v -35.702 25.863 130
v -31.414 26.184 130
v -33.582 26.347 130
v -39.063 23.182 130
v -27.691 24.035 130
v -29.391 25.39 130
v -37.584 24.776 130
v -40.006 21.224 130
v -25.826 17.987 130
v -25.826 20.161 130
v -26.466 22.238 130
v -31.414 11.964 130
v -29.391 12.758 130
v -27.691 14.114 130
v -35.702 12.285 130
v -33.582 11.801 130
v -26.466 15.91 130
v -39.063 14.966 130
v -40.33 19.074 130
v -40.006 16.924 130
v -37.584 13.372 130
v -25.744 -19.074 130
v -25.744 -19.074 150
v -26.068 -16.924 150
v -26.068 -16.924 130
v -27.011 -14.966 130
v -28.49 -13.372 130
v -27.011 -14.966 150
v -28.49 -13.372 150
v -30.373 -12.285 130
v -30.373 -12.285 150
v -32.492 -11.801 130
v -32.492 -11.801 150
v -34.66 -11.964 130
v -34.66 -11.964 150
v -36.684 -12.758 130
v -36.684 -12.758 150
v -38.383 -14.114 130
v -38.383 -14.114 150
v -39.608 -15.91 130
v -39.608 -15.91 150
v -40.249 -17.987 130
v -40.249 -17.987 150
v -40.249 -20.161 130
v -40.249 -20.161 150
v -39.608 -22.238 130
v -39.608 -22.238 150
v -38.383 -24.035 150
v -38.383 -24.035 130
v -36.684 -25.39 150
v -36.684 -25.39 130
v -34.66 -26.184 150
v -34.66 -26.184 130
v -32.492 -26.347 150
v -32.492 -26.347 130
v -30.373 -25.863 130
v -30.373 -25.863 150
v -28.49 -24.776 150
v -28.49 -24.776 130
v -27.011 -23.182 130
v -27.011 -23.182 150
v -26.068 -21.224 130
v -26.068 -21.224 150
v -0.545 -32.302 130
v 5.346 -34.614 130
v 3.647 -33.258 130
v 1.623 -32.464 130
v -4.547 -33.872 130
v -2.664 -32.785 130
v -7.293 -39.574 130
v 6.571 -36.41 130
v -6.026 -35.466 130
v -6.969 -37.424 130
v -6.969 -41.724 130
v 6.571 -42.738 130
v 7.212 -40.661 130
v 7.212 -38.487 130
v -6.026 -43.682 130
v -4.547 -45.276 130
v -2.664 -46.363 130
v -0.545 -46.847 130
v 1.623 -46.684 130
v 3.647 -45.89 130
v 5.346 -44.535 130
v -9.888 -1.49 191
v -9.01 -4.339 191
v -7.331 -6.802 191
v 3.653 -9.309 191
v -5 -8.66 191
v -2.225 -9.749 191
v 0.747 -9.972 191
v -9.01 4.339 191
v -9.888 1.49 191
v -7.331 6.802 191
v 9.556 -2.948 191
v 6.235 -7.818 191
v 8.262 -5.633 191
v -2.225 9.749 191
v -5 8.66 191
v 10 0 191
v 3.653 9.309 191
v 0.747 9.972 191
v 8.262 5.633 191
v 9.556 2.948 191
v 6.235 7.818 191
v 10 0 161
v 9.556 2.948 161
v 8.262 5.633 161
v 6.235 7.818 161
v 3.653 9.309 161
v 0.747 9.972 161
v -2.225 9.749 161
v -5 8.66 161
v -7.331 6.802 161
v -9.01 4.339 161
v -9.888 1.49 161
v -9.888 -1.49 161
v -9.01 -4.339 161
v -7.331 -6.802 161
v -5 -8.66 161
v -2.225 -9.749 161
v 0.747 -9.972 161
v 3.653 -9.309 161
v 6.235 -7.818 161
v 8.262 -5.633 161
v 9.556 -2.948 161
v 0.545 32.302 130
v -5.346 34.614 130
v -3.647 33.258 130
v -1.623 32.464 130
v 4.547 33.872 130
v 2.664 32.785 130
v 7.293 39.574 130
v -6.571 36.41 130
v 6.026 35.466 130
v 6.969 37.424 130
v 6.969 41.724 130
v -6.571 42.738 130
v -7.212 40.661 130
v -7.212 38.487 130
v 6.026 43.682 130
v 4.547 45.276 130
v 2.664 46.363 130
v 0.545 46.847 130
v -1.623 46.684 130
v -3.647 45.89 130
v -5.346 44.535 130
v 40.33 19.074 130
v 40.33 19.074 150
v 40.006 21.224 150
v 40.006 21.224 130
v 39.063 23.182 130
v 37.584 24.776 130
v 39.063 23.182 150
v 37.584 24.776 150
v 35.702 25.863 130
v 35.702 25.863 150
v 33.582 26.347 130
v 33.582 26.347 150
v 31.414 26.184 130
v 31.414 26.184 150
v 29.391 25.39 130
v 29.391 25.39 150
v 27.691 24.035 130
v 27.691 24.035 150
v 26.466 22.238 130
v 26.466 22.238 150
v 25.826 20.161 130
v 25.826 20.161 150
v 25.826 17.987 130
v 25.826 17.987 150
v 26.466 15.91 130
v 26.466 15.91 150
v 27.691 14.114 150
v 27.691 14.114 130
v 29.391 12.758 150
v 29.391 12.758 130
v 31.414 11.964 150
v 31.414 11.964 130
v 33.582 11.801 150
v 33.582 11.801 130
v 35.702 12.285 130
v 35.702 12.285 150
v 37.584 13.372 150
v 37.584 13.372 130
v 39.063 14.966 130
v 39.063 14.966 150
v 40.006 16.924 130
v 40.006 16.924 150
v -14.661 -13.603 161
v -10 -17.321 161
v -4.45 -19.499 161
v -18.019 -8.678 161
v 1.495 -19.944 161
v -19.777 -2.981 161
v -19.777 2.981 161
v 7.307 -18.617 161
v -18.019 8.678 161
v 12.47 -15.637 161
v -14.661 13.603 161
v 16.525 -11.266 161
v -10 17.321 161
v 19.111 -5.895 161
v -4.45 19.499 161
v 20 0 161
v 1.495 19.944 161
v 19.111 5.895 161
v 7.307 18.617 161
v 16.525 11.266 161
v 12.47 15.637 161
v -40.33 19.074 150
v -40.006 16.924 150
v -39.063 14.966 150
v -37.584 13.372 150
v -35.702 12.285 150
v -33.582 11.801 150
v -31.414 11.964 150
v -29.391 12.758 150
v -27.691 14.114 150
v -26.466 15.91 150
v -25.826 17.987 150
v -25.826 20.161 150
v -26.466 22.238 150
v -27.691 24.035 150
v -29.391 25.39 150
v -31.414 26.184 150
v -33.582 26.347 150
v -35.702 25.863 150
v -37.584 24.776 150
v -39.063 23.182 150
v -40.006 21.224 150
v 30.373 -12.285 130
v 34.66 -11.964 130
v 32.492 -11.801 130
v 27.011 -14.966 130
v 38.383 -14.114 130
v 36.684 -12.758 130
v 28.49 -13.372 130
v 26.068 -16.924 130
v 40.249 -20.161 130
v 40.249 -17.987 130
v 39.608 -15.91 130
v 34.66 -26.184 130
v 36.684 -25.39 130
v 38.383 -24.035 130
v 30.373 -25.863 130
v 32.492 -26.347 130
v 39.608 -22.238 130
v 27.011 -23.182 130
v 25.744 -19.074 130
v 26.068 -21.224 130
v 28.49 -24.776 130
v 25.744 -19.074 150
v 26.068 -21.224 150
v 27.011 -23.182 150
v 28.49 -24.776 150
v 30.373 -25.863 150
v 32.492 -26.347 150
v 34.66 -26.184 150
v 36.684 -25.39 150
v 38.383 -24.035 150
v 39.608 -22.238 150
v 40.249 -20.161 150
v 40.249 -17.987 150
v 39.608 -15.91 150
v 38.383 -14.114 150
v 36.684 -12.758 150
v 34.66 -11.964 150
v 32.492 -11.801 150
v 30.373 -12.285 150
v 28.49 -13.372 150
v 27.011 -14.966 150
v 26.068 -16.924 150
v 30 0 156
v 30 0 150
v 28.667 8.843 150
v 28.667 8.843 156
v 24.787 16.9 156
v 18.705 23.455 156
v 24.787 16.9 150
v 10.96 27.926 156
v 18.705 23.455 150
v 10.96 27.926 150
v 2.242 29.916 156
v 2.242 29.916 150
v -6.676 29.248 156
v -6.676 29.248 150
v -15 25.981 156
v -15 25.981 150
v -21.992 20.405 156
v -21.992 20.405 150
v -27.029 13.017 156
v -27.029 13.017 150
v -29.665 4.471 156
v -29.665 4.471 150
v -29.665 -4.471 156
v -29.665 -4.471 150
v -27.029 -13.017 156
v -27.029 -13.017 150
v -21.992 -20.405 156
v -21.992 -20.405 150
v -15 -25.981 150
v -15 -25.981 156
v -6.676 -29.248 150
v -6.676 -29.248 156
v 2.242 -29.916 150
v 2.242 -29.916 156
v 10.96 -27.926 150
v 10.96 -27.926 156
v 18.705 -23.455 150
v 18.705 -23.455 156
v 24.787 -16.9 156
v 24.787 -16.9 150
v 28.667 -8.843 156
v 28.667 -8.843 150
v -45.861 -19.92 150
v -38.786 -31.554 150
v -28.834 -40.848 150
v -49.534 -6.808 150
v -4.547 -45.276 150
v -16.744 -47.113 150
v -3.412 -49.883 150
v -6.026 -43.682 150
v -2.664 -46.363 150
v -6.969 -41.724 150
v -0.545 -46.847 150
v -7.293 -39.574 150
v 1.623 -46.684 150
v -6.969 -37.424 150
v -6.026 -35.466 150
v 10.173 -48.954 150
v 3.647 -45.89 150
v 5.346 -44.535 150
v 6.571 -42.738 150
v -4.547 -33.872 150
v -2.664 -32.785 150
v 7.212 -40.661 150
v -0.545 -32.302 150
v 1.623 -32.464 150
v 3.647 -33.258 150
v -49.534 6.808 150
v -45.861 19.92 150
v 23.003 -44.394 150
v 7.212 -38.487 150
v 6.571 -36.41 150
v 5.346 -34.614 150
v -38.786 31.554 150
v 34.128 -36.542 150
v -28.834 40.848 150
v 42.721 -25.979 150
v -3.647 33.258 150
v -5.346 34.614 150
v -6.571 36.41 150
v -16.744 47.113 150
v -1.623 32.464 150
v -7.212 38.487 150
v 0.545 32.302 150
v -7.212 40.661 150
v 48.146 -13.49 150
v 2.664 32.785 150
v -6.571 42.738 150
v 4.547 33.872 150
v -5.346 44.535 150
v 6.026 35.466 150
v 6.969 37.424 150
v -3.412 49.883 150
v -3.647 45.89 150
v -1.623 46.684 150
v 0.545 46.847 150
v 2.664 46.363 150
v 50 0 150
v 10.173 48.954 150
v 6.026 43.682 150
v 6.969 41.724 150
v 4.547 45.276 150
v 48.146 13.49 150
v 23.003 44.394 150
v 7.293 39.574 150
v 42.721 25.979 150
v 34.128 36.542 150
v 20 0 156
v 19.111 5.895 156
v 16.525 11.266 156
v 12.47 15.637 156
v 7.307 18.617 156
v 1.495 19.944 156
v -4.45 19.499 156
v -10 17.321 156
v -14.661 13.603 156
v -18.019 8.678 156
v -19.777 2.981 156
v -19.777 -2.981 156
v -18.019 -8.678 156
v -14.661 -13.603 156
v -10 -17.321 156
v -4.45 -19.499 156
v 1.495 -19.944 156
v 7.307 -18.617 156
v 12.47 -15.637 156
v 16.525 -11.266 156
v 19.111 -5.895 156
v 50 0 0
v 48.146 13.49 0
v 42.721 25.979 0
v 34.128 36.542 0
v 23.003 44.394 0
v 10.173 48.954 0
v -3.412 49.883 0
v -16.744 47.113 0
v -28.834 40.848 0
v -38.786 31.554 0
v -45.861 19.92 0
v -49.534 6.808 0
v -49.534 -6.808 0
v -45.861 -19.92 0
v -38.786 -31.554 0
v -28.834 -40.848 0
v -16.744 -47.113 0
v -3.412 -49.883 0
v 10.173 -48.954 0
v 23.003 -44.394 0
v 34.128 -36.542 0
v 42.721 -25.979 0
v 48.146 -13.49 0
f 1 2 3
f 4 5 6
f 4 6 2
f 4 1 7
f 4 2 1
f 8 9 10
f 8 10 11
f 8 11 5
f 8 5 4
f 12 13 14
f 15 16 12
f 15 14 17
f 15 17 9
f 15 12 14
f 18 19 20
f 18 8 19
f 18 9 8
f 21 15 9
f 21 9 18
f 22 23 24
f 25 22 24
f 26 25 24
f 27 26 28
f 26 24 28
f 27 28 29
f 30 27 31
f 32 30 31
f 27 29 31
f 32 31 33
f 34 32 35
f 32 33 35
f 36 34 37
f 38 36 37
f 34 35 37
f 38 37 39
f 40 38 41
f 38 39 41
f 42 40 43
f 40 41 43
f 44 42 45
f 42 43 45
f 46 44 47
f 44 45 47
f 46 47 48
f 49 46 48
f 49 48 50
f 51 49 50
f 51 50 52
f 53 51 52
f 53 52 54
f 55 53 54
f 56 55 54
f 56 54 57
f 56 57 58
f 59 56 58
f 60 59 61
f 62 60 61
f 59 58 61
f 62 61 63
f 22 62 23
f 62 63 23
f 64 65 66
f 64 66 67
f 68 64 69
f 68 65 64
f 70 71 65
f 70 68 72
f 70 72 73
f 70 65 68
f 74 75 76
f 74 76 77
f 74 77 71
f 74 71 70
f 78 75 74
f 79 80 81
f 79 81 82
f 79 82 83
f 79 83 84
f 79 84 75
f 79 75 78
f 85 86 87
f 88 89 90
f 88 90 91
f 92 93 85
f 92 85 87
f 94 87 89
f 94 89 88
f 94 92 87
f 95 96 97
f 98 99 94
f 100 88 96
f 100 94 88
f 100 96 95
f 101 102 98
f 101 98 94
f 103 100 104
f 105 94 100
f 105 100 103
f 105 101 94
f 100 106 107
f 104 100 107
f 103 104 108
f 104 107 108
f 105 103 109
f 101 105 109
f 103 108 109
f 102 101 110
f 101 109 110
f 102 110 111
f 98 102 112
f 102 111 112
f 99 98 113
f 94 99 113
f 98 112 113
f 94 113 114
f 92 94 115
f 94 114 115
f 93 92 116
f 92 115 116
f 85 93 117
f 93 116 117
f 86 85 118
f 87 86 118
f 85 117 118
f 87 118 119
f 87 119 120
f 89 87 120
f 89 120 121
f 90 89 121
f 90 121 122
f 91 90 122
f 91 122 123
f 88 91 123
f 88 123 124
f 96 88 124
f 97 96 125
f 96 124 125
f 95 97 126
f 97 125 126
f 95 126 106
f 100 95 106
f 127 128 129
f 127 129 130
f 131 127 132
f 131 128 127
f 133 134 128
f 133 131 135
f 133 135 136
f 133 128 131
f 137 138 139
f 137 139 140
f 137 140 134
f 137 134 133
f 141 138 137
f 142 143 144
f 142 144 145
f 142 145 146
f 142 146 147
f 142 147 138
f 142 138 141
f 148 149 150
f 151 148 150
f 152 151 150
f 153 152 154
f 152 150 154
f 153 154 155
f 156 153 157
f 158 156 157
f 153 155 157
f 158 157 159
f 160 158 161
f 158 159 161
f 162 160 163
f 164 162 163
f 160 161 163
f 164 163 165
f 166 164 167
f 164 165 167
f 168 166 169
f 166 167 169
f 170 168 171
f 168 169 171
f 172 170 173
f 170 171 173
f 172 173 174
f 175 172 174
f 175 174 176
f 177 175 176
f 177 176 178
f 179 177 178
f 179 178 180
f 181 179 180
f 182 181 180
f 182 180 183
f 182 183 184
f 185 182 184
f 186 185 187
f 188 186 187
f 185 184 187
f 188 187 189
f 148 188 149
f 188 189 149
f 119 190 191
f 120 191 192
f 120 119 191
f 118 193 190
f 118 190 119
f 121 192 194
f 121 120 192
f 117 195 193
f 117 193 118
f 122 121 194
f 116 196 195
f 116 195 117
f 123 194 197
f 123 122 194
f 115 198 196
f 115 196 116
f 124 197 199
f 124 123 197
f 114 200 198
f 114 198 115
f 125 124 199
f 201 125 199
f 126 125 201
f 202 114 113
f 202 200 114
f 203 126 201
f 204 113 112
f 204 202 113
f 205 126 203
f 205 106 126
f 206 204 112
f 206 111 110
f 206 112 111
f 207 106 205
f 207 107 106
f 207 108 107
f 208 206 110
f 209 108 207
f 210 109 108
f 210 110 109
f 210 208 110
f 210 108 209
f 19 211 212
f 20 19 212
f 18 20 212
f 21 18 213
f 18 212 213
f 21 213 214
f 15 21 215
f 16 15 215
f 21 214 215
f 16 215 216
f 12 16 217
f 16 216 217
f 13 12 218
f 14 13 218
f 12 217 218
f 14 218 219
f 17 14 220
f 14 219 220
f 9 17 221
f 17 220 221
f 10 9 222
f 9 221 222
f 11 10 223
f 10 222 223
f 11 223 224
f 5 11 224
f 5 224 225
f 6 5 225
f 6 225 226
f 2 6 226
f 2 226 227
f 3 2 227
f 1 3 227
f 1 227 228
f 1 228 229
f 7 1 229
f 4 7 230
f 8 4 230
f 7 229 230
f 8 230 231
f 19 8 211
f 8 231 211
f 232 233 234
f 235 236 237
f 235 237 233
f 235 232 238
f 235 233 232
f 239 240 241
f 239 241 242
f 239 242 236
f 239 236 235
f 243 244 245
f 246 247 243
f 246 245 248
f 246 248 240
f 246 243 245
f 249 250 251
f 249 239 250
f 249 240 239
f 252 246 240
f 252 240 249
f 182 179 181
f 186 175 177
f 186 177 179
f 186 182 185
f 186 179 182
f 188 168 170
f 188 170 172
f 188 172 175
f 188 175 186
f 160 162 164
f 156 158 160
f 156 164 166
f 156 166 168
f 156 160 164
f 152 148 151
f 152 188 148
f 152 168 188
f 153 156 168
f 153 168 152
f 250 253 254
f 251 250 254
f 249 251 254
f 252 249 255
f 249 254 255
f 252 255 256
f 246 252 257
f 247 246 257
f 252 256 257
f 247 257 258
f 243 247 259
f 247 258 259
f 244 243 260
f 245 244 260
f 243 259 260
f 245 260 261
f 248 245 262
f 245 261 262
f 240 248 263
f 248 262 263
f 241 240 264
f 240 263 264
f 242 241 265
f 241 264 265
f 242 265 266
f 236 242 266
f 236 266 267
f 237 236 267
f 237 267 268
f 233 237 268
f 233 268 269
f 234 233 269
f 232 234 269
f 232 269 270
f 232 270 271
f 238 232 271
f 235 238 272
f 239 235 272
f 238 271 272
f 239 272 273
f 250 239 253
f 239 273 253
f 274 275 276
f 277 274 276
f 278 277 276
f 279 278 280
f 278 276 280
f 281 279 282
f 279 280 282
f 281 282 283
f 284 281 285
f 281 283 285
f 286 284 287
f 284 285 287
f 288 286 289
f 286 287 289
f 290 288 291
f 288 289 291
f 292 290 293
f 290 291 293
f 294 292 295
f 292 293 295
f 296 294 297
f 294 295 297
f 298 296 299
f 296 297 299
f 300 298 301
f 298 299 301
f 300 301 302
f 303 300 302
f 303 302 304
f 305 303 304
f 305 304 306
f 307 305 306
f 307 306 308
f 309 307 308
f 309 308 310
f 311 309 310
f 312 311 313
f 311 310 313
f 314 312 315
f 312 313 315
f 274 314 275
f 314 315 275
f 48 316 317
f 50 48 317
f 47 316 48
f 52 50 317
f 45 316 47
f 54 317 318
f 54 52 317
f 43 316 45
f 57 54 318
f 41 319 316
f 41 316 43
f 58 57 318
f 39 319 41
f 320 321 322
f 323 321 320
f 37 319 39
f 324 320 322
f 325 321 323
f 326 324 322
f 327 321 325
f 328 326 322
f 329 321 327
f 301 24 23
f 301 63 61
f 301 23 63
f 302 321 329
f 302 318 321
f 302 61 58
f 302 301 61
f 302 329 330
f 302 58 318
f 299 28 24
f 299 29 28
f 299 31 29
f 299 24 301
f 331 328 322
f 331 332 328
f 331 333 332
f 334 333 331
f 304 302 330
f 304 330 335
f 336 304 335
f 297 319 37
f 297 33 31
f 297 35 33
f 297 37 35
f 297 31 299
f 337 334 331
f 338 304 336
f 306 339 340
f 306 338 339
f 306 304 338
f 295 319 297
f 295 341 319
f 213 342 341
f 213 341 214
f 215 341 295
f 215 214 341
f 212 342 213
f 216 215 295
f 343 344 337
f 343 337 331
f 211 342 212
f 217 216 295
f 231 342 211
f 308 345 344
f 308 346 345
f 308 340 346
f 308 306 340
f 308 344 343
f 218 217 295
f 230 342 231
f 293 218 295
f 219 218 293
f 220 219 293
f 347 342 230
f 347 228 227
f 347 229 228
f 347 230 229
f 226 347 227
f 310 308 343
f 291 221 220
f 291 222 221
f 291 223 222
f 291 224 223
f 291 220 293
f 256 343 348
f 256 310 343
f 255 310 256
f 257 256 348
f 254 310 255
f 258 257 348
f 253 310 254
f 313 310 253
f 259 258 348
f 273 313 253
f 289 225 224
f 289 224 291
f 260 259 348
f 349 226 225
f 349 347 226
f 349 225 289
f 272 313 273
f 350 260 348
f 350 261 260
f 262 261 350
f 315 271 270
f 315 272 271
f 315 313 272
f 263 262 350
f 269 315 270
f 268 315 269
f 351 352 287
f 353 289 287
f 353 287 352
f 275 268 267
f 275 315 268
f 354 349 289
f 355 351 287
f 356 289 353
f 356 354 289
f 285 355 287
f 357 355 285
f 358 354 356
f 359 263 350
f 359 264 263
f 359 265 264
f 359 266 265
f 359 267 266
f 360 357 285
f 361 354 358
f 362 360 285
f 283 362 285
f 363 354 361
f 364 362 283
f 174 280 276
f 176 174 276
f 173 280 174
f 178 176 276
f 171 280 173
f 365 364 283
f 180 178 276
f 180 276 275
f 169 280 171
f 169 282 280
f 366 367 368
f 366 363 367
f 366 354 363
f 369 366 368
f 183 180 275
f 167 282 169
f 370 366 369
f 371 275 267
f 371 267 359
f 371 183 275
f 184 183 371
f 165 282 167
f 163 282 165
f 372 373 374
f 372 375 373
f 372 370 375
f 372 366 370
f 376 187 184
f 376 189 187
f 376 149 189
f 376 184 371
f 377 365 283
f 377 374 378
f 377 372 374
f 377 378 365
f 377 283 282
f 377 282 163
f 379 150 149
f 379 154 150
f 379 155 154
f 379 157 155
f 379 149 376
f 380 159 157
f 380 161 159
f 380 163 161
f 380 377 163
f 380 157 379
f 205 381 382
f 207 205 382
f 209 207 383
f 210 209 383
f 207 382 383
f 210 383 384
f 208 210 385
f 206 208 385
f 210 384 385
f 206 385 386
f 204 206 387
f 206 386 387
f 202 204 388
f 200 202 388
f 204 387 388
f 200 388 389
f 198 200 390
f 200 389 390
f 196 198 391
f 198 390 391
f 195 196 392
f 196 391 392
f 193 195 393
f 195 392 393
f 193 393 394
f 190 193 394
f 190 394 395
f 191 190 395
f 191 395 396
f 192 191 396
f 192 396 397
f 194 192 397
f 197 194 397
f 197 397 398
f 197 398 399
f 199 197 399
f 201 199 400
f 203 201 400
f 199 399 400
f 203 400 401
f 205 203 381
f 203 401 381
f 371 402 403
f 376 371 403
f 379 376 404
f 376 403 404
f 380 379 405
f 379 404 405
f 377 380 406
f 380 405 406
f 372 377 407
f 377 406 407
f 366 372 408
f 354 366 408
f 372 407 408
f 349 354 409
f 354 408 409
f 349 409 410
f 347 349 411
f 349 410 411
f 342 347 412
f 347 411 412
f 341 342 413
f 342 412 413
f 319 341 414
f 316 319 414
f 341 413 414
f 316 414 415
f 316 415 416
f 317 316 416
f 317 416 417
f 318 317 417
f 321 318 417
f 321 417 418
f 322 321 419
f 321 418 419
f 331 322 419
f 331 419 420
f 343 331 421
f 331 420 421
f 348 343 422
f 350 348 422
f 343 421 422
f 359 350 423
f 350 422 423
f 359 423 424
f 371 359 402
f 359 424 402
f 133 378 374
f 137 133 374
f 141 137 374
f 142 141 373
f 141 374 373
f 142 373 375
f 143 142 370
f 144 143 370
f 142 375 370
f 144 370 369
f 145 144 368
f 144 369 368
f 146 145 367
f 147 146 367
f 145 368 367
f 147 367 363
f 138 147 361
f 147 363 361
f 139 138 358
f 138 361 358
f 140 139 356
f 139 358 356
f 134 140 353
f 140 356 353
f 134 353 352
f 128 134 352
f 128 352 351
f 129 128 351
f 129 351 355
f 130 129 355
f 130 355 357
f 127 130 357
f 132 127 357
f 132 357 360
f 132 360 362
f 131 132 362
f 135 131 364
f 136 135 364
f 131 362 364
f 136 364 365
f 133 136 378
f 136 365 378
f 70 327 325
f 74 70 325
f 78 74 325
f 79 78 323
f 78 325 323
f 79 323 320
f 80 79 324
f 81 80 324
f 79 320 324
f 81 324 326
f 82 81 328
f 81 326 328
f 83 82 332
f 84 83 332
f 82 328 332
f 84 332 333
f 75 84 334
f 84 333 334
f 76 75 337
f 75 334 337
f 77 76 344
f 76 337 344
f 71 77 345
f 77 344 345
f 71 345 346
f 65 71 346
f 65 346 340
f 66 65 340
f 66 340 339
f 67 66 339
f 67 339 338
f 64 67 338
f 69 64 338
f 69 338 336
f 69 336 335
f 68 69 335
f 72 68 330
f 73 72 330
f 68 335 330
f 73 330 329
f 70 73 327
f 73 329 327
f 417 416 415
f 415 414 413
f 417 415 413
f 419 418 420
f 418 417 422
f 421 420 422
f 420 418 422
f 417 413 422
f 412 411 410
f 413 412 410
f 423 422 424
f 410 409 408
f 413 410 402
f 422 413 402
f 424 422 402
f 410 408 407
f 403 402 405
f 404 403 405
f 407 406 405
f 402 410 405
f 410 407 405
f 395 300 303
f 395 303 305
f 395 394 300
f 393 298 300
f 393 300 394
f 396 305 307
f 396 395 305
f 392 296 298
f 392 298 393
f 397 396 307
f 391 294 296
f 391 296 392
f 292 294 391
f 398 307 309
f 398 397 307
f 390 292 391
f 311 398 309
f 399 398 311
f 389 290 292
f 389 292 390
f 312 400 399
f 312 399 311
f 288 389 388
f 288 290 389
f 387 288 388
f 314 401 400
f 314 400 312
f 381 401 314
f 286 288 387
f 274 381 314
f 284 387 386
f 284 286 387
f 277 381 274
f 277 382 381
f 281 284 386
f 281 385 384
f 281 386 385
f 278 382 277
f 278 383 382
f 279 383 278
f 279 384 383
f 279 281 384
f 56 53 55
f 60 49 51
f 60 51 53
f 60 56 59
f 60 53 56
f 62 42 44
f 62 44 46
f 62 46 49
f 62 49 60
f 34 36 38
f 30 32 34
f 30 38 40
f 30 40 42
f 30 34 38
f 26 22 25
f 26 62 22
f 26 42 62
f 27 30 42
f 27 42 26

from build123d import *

# Parameters (mm, degrees)
SKETCH_4_R          = 50
EXTRUDE_1_DEPTH     = 150
SKETCH_5_R          = 30
EXTRUDE_2_DEPTH     = 6
SKETCH_6_R          = 20
EXTRUDE_3_DEPTH     = 5
SKETCH_7_R          = 10
EXTRUDE_4_DEPTH     = 30
SKETCH_8_R          = 7.293017107
CUT_EXTRUDE_1_DEPTH = 20


with BuildPart() as part:
    # 草图4 → 凸台-拉伸1 (new body)
    with BuildSketch(Plane.XY):
        Circle(SKETCH_4_R)
    extrude(amount=EXTRUDE_1_DEPTH)

    # 草图5 → 凸台-拉伸2 (add)
    with BuildSketch(Plane.XY.offset(150)):
        Circle(SKETCH_5_R)
    extrude(amount=EXTRUDE_2_DEPTH)

    # 草图6 → 凸台-拉伸3 (add)
    with BuildSketch(Plane.XY.offset(156)):
        Circle(SKETCH_6_R)
    extrude(amount=EXTRUDE_3_DEPTH)

    # 草图7 → 凸台-拉伸4 (add)
    with BuildSketch(Plane.XY.offset(161)):
        Circle(SKETCH_7_R)
    extrude(amount=EXTRUDE_4_DEPTH)

    # 草图8 → 切除-拉伸1 (cut)
    with BuildSketch(Plane.XY.offset(150)):
        with Locations((0, 39.574124617)):
            Circle(SKETCH_8_R)
        with Locations((33.03726858, 19.074075908)):
            Circle(SKETCH_8_R)
        with Locations(Location((0, -39.574124617, 0), (0, 0, 180))):
            Circle(SKETCH_8_R)
        with Locations(Location((-33.03726858, 19.074075908, 0), (0, 0, 180))):
            Circle(SKETCH_8_R)
        with Locations(Location((33.03726858, -19.074075908, 0), (0, 0, 180))):
            Circle(SKETCH_8_R)
        with Locations((-33.03726858, -19.074075908)):
            Circle(SKETCH_8_R)
    extrude(amount=-CUT_EXTRUDE_1_DEPTH, mode=Mode.SUBTRACT)


solid = part.part
